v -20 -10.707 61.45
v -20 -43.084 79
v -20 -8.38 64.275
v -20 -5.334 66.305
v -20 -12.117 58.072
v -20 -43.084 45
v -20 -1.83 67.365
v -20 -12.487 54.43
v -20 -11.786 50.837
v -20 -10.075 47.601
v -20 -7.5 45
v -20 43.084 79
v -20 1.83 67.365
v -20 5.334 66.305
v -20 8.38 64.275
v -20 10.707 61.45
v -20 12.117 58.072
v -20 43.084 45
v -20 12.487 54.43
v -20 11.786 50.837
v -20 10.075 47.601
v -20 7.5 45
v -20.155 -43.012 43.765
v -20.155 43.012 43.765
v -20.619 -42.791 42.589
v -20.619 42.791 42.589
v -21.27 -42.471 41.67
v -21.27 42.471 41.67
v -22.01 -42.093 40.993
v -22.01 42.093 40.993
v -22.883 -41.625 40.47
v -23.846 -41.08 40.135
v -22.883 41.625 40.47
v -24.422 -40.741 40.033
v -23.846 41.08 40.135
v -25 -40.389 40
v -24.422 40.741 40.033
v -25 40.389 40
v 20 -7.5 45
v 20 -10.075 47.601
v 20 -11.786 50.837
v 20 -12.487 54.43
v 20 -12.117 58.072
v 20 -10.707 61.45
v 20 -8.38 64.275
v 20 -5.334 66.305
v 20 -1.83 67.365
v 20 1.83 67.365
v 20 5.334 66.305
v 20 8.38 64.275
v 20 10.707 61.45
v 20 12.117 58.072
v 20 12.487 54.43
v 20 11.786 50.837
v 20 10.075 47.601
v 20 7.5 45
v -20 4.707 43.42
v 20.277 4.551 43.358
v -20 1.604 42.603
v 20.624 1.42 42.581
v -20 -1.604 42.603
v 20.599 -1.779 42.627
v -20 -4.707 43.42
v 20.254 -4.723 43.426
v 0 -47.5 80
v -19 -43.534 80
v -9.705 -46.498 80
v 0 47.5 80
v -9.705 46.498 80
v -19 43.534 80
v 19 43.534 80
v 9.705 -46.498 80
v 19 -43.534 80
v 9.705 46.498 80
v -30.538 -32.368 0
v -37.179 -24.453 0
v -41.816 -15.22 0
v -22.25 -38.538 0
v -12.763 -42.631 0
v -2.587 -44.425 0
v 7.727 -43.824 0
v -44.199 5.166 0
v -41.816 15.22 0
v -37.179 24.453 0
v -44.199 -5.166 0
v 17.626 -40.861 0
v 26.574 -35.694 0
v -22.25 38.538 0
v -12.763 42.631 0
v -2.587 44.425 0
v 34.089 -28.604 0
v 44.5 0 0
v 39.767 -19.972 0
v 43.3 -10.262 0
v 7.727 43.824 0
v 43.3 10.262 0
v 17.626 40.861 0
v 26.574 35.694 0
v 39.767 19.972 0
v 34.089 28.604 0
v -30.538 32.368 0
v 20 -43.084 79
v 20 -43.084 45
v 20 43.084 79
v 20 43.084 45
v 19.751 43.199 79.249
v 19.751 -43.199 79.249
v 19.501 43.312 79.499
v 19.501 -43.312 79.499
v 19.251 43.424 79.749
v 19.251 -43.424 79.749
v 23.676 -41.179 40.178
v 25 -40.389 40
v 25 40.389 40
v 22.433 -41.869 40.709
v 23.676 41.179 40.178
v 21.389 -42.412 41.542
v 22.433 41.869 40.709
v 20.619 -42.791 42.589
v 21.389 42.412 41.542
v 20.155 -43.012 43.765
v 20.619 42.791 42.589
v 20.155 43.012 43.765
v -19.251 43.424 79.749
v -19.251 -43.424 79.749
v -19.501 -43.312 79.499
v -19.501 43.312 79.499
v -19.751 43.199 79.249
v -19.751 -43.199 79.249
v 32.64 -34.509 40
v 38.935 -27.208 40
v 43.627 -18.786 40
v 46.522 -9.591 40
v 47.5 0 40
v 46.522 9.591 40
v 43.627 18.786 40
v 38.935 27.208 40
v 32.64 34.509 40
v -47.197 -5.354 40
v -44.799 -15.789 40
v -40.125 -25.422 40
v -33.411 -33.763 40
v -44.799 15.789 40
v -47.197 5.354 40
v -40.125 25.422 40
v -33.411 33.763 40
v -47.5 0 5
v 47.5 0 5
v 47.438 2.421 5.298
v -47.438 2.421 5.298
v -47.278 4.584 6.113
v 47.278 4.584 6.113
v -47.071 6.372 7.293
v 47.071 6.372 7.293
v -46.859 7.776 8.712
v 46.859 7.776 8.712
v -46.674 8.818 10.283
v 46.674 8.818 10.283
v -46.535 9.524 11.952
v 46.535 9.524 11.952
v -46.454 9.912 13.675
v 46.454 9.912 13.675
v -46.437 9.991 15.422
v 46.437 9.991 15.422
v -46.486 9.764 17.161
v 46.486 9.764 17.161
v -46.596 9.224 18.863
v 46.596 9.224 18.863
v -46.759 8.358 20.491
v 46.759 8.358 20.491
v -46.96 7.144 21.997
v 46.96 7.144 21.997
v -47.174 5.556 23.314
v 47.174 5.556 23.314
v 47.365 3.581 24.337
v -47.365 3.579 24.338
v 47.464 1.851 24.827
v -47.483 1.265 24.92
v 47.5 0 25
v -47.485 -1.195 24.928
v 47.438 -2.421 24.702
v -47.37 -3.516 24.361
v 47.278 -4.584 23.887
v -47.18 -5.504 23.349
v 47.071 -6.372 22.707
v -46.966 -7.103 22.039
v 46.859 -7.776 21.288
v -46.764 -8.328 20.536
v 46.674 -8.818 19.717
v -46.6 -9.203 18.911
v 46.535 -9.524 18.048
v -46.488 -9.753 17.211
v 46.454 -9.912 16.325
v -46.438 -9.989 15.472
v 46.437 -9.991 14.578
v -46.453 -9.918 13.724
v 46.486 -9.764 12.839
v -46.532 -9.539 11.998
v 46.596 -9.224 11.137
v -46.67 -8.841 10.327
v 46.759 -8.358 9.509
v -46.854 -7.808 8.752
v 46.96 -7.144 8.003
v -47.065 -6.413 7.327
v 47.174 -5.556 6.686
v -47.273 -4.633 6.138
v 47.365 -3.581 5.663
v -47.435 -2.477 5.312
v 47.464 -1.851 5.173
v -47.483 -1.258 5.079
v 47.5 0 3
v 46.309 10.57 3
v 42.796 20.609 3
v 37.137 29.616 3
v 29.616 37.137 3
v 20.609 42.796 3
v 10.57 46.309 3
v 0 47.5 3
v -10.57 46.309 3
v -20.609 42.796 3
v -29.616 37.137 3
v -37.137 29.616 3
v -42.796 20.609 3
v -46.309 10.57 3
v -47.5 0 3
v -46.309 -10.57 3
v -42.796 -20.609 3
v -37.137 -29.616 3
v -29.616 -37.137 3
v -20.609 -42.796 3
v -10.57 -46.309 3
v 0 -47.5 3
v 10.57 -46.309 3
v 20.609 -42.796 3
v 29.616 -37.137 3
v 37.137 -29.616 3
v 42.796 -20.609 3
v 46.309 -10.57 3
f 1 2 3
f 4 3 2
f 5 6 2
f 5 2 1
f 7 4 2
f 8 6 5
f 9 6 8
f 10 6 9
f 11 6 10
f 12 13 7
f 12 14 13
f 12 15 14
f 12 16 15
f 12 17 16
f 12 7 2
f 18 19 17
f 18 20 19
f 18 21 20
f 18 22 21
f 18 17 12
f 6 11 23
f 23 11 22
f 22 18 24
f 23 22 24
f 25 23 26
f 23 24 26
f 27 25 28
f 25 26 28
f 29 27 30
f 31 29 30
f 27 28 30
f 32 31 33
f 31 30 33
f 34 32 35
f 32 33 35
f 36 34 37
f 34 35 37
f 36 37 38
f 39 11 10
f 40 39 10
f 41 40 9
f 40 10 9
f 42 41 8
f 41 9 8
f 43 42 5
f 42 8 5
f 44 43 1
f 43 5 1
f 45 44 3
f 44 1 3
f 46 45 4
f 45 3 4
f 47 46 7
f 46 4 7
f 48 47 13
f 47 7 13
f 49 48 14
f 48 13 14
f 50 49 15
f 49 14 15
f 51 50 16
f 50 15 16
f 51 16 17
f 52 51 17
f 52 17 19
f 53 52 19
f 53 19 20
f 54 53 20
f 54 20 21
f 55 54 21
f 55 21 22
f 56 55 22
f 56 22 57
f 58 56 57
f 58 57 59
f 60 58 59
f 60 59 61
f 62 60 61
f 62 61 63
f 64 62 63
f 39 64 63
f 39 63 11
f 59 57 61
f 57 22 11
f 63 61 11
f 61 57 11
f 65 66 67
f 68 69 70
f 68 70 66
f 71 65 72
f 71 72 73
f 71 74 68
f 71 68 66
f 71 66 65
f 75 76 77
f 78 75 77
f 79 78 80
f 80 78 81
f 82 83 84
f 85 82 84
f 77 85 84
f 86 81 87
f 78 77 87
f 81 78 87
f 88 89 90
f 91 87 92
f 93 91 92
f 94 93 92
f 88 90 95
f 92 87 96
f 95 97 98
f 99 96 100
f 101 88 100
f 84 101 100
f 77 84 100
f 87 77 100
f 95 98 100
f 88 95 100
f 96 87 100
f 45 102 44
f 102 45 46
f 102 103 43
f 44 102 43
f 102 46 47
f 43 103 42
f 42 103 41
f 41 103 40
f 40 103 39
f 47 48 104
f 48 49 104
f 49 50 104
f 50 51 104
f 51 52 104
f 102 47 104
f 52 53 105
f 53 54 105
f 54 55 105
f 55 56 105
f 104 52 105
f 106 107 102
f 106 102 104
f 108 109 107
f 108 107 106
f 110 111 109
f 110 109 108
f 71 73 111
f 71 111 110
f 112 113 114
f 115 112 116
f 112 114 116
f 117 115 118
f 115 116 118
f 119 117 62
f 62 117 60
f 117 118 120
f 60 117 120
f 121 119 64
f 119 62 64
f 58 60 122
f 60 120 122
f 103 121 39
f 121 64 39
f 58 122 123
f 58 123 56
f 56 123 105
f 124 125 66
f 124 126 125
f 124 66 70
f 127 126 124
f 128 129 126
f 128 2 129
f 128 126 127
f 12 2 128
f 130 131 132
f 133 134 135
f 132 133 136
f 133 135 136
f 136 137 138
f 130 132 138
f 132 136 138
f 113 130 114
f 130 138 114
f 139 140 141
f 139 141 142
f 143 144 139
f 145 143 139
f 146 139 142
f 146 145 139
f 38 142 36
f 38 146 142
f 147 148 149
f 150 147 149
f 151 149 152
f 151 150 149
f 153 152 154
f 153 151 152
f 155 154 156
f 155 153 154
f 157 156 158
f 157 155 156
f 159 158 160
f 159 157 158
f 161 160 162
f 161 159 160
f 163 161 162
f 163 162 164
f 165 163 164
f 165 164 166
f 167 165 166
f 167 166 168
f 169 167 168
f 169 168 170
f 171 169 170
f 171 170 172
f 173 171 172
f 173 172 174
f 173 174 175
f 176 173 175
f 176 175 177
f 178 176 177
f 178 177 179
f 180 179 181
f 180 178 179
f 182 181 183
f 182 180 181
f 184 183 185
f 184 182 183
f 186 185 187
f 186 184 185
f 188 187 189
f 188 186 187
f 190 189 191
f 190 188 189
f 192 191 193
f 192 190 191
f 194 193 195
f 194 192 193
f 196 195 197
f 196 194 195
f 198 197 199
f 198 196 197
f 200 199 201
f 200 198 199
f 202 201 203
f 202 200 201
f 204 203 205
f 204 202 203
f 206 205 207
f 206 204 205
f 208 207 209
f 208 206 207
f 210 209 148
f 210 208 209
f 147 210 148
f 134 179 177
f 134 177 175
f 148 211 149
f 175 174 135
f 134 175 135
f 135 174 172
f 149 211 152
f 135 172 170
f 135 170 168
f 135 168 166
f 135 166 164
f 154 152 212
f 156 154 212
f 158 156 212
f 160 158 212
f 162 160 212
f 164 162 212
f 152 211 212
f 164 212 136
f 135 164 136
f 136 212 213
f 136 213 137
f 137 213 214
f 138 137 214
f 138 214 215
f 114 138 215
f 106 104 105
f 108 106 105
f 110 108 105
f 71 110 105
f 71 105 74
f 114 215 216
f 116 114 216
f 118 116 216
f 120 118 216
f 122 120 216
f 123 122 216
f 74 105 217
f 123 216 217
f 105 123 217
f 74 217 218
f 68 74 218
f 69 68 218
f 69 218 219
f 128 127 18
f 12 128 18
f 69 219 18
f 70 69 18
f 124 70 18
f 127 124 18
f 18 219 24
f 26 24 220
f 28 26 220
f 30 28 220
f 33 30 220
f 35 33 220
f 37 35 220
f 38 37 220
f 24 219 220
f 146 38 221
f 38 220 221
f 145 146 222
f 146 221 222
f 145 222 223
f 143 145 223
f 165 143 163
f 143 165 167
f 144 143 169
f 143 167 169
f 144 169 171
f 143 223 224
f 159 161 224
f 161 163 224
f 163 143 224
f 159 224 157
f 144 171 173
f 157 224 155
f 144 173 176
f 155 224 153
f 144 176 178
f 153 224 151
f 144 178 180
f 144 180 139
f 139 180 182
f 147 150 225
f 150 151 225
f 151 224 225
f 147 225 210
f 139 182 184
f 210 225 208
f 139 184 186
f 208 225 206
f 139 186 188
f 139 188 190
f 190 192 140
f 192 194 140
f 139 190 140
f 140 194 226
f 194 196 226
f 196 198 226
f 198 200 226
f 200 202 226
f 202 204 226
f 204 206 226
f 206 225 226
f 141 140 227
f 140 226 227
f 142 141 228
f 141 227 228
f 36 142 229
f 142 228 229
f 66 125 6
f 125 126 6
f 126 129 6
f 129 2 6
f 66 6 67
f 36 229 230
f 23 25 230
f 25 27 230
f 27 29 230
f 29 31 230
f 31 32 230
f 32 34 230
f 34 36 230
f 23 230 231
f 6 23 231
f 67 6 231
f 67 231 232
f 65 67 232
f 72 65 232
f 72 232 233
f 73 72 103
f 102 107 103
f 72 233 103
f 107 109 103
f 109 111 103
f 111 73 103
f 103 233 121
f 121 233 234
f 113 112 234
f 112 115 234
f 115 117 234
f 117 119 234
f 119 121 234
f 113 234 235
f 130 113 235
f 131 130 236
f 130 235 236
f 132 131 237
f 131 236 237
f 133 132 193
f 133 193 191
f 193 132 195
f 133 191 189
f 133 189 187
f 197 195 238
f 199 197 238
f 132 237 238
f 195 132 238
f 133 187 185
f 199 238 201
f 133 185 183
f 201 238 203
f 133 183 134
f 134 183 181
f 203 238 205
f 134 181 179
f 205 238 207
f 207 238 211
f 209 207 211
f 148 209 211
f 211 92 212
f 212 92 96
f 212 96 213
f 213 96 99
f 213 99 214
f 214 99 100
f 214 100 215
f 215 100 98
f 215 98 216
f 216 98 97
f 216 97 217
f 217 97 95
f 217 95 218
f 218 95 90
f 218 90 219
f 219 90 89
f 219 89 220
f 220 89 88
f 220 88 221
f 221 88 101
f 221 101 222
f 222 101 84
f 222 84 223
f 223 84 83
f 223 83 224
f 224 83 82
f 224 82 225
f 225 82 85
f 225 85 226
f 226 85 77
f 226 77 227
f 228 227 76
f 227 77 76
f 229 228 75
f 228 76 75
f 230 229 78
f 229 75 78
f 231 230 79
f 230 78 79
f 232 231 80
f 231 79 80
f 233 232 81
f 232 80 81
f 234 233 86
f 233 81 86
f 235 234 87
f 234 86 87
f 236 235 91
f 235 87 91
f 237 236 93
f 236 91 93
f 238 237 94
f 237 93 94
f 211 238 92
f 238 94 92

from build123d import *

# Parameters (mm, degrees)
SKETCH_1_R               = 47.5
EXTRUDE_1_DEPTH          = 80
CUT_EXTRUDE_START        = -40
CUT_EXTRUDE_1_DEPTH      = 40
FILLET_1_R               = 5
SKETCH_3_R               = 12.5
CUT_EXTRUDE_2_DEPTH      = 115.945639495
CHAMFER_1_SIZE           = 1
CHAMFER_2_SIZE           = 3
CUT_EXTRUDE_3_DEPTH      = 105.462912246
CUT_EXTRUDE_3_DEPTH_BACK = 105.462912246
SKETCH_4_R               = 10


with BuildPart() as part:
    # Эскиз1 → Бобышка-Вытянуть1 (new body)
    with BuildSketch(Plane.XY):
        Circle(SKETCH_1_R)
    extrude(amount=EXTRUDE_1_DEPTH)

    # Эскиз2 → Вырез-Вытянуть1 (cut)
    with BuildSketch(Plane.XY.offset(80).offset(CUT_EXTRUDE_START)):
        with BuildLine():
            Line((20, -43.084219849), (20, 43.084219849))
            ThreePointArc((20, 43.084219849), (47.5, 0), (20, -43.084219849))
        make_face()
        with BuildLine():
            Line((-20, -43.084219849), (-20, 43.084219849))
            ThreePointArc((-20, 43.084219849), (-47.5, 0), (-20, -43.084219849))
        make_face()
    extrude(amount=CUT_EXTRUDE_1_DEPTH, mode=Mode.SUBTRACT)

    # Скругление1
    fillet_1_edges = [part.edges().sort_by_distance(p)[0] for p in [
        (-20, 0, 40),
        (20, 0, 40),
    ]]
    fillet(fillet_1_edges, radius=FILLET_1_R)

    # Эскиз3 → Вырез-Вытянуть2 (cut, through all)
    with BuildSketch(Plane.ZY.offset(20)):
        with Locations(Location((55, 0, 0), (0, 0, 216.869897646))):
            Circle(SKETCH_3_R)
    extrude(amount=-CUT_EXTRUDE_2_DEPTH, mode=Mode.SUBTRACT)

    # Фаска1
    chamfer_1_edges = [part.edges().sort_by_distance(p)[0] for p in [
        (-20, 0, 80),
        (20, 0, 80),
    ]]
    chamfer(chamfer_1_edges, length=CHAMFER_1_SIZE)

    # Фаска2
    chamfer_2_edges = [part.edges().sort_by_distance(p)[0] for p in [
        (-47.5, 0, 0),
    ]]
    chamfer(chamfer_2_edges, length=CHAMFER_2_SIZE)

    # Эскиз4 → Вырез-Вытянуть3 (cut, two sides: drawn at the far end of the back side and taken through both)
    with BuildSketch(Plane(origin=(0, 0, 0), x_dir=(0, 0, -1), z_dir=(1, 0, 0)).offset(-CUT_EXTRUDE_3_DEPTH_BACK)):
        with Locations((-15, 0)):
            Circle(SKETCH_4_R)
    extrude(amount=CUT_EXTRUDE_3_DEPTH + CUT_EXTRUDE_3_DEPTH_BACK, mode=Mode.SUBTRACT)


solid = part.part
